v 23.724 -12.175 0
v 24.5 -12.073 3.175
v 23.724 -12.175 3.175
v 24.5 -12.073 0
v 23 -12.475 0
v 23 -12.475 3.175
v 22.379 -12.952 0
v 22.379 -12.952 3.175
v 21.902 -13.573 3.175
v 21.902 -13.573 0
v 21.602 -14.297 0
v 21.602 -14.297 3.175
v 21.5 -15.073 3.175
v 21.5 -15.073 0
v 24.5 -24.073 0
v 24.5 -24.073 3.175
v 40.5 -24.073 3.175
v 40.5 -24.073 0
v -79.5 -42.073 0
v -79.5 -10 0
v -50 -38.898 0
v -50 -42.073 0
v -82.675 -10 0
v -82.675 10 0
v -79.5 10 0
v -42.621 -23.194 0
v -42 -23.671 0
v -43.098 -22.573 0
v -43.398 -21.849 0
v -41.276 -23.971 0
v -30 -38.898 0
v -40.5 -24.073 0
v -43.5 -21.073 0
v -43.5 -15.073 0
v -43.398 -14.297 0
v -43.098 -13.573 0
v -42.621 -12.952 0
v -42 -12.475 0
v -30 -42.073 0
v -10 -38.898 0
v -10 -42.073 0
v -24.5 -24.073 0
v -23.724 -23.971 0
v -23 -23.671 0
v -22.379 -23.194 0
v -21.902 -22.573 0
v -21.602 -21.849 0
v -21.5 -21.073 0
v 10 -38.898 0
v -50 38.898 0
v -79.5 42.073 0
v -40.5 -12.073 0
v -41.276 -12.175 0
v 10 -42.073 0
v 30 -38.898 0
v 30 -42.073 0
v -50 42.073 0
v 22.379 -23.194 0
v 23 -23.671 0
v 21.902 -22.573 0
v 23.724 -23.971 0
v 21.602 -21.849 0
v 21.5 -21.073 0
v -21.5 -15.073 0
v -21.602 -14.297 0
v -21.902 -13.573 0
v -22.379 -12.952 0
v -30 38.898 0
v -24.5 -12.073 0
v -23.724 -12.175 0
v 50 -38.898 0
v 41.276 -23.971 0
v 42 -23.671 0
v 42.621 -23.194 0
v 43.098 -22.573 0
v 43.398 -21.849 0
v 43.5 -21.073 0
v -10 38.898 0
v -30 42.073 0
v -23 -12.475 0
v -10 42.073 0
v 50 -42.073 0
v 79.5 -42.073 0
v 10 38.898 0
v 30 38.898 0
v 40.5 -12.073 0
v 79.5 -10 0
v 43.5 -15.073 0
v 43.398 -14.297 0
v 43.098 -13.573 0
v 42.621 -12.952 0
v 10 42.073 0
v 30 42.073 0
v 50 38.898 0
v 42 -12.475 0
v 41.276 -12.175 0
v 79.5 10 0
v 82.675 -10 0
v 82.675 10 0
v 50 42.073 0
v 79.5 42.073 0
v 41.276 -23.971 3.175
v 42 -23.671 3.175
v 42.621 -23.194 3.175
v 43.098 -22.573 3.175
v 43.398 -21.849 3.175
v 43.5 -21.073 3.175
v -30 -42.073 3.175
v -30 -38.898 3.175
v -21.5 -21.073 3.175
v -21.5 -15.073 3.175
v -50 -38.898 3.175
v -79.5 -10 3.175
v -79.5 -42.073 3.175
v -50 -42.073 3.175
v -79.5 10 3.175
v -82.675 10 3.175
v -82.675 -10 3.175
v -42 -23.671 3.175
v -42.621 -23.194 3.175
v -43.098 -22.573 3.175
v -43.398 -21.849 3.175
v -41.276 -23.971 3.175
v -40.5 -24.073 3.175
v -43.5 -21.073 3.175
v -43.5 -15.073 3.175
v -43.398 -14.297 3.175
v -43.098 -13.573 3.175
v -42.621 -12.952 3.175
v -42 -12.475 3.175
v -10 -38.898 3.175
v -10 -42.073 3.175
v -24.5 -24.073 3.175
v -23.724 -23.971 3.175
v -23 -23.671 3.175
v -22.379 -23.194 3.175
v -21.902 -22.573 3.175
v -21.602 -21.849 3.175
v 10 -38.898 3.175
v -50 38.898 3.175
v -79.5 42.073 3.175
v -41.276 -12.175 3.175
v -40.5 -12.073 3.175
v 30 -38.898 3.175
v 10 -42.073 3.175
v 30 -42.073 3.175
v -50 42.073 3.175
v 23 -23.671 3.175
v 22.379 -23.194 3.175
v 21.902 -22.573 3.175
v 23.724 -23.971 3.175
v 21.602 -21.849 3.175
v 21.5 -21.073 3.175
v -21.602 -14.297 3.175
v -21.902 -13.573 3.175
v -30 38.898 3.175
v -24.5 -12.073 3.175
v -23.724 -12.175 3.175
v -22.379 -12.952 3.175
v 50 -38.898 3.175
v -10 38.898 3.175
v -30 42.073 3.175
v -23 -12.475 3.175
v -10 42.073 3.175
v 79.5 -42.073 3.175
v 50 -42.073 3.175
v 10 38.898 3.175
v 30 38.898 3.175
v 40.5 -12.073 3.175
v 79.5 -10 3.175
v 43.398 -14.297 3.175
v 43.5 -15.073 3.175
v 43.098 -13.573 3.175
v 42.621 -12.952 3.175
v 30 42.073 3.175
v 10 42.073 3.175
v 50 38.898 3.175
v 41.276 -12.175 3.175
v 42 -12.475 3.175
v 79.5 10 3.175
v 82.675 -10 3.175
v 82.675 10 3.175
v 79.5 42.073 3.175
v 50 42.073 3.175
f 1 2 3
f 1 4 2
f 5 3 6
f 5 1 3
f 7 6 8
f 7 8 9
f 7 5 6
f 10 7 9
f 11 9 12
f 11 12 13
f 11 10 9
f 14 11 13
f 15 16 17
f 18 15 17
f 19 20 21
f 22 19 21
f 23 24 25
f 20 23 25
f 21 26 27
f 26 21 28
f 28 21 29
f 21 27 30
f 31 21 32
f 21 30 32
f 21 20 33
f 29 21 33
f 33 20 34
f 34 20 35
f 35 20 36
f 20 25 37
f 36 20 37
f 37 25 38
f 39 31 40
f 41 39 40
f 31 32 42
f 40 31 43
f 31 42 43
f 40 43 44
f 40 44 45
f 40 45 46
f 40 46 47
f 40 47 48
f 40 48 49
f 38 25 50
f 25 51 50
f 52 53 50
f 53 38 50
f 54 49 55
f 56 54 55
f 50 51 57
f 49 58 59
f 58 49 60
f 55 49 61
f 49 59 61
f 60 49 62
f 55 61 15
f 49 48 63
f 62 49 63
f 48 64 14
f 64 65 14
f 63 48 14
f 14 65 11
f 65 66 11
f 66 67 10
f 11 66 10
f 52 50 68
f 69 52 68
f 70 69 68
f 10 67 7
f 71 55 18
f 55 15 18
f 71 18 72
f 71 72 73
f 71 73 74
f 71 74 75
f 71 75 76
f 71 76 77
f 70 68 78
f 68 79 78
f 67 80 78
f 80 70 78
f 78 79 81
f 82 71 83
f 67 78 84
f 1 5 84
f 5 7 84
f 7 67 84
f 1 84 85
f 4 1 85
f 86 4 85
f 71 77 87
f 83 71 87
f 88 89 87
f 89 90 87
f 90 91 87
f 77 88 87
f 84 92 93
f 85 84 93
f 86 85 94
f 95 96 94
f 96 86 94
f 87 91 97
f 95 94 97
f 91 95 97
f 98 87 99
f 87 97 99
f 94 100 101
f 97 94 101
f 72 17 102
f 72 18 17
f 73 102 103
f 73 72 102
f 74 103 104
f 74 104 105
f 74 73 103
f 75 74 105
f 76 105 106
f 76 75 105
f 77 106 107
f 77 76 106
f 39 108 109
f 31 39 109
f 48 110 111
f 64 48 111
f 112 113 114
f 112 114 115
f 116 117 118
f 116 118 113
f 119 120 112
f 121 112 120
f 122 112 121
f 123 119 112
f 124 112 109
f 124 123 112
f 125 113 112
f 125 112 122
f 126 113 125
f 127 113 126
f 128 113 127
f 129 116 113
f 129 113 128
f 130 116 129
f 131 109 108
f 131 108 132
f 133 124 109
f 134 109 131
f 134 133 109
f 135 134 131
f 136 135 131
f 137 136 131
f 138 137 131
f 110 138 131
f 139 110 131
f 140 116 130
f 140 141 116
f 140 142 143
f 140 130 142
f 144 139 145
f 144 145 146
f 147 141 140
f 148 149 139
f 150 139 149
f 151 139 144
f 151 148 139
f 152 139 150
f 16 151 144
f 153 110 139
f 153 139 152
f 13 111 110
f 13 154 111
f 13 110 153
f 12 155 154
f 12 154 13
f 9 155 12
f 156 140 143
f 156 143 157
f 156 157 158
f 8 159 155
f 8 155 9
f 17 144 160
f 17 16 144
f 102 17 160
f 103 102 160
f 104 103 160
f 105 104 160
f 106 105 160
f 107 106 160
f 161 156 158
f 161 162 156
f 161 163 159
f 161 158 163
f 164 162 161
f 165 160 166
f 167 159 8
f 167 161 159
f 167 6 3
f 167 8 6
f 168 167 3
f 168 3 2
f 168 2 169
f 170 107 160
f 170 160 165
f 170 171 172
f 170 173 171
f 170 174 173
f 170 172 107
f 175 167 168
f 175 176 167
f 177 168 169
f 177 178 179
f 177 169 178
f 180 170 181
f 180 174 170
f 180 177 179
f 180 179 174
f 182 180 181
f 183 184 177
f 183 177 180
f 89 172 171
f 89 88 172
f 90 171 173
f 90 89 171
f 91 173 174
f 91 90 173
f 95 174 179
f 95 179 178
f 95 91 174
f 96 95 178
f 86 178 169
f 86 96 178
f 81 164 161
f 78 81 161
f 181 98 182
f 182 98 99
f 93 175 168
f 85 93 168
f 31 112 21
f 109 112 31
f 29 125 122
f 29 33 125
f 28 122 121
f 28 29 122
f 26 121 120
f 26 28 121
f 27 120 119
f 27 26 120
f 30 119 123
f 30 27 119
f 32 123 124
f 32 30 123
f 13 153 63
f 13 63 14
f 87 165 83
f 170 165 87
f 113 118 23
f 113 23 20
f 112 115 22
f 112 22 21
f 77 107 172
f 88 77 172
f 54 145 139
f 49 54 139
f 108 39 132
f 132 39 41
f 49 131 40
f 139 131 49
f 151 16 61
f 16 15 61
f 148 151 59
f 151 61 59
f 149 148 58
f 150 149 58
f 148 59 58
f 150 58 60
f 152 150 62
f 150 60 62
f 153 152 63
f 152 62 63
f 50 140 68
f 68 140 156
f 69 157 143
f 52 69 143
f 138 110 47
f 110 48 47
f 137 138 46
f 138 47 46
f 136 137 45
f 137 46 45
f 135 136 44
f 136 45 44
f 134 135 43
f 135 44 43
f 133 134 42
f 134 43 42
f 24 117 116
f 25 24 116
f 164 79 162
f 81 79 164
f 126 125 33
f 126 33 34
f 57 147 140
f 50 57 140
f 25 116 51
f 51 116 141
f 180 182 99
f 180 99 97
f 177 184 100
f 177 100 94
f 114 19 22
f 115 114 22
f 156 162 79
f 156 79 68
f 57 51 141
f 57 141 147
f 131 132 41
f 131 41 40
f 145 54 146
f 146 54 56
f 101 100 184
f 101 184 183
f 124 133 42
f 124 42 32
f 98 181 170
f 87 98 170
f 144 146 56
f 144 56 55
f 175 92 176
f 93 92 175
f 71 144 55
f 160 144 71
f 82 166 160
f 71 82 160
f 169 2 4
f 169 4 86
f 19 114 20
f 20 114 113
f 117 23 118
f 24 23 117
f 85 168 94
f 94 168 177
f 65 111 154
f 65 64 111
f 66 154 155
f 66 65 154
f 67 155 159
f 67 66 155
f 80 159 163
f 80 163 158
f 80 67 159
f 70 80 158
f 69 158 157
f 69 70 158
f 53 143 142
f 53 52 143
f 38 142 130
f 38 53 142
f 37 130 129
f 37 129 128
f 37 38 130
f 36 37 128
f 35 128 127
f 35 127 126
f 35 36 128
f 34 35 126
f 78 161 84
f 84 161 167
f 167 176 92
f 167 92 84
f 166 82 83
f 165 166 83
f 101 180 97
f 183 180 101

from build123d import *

# Parameters (mm, degrees)
ESQUISSE1_W             = 165.35
ESQUISSE1_H             = 84.146
BOSS_EXTRU_1_DEPTH      = 3.175
ESQUISSE2_W             = 3.175
ESQUISSE2_H             = 32.073
ENL_V_MAT_EXTRU_1_DEPTH = 93.819036727
ESQUISSE3_W             = 20
ESQUISSE3_H             = 3.175
ENL_V_MAT_EXTRU_2_DEPTH = 93.819036727
ESQUISSE5_W             = 22
ESQUISSE5_H             = 12
ENL_V_MAT_EXTRU_3_DEPTH = 93.819036727
CONG_1_R                = 3
CONG_1_OF_SYM_TRIE3_R   = 3


with BuildPart() as part:
    # Esquisse1 → Boss.-Extru.1 (new body)
    with BuildSketch(Plane.XY):
        Rectangle(ESQUISSE1_W, ESQUISSE1_H)
    extrude(amount=BOSS_EXTRU_1_DEPTH)

    # Esquisse2 → Enlèv. mat.-Extru.1 (cut, through all)
    with BuildSketch(Plane.XY.offset(3.175)):
        with Locations((-81.0875, -26.0365)):
            Rectangle(ESQUISSE2_W, ESQUISSE2_H)
        with Locations((-81.0875, 26.0365)):
            Rectangle(ESQUISSE2_W, ESQUISSE2_H)
    enl_v_mat_extru_1 = extrude(amount=-ENL_V_MAT_EXTRU_1_DEPTH, mode=Mode.SUBTRACT)

    # Symétrie1: Enlèv. mat.-Extru.1 across plane
    add(enl_v_mat_extru_1.mirror(Plane(origin=(0, 0, 0), x_dir=(0, 0, 1), z_dir=(1, 0, 0))), mode=Mode.SUBTRACT)

    # Esquisse3 → Enlèv. mat.-Extru.2 (cut, through all)
    with BuildSketch(Plane.XY.offset(3.175)):
        with Locations((0, -40.4855)):
            Rectangle(ESQUISSE3_W, ESQUISSE3_H)
        with Locations((40, -40.4855)):
            Rectangle(ESQUISSE3_W, ESQUISSE3_H)
        with Locations((-40, -40.4855)):
            Rectangle(ESQUISSE3_W, ESQUISSE3_H)
    enl_v_mat_extru_2 = extrude(amount=-ENL_V_MAT_EXTRU_2_DEPTH, mode=Mode.SUBTRACT)

    # Symétrie2: Enlèv. mat.-Extru.2 across plane
    add(enl_v_mat_extru_2.mirror(Plane.ZX), mode=Mode.SUBTRACT)

    # Esquisse5 → Enlèv. mat.-Extru.3 (cut, through all)
    with BuildSketch(Plane.XY.offset(3.175)):
        with Locations((32.5, -18.073)):
            Rectangle(ESQUISSE5_W, ESQUISSE5_H)
    enl_v_mat_extru_3 = extrude(amount=-ENL_V_MAT_EXTRU_3_DEPTH, mode=Mode.SUBTRACT)

    # Congé1
    cong_1_edges = [part.edges().sort_by_distance(p)[0] for p in [
        (21.5, -24.073, 1.5875),
        (21.5, -12.073, 1.5875),
        (43.5, -12.073, 1.5875),
        (43.5, -24.073, 1.5875),
    ]]
    fillet(cong_1_edges, radius=CONG_1_R)

    # Symétrie3: Enlèv. mat.-Extru.3 across plane
    add(enl_v_mat_extru_3.mirror(Plane(origin=(0, 0, 0), x_dir=(0, 0, 1), z_dir=(1, 0, 0))), mode=Mode.SUBTRACT)

    # Congé1 of Symétrie3
    cong_1_of_sym_trie3_edges = [part.edges().sort_by_distance(p)[0] for p in [
        (-21.5, -24.073, 1.5875),
        (-21.5, -12.073, 1.5875),
        (-43.5, -12.073, 1.5875),
        (-43.5, -24.073, 1.5875),
    ]]
    fillet(cong_1_of_sym_trie3_edges, radius=CONG_1_OF_SYM_TRIE3_R)


solid = part.part
